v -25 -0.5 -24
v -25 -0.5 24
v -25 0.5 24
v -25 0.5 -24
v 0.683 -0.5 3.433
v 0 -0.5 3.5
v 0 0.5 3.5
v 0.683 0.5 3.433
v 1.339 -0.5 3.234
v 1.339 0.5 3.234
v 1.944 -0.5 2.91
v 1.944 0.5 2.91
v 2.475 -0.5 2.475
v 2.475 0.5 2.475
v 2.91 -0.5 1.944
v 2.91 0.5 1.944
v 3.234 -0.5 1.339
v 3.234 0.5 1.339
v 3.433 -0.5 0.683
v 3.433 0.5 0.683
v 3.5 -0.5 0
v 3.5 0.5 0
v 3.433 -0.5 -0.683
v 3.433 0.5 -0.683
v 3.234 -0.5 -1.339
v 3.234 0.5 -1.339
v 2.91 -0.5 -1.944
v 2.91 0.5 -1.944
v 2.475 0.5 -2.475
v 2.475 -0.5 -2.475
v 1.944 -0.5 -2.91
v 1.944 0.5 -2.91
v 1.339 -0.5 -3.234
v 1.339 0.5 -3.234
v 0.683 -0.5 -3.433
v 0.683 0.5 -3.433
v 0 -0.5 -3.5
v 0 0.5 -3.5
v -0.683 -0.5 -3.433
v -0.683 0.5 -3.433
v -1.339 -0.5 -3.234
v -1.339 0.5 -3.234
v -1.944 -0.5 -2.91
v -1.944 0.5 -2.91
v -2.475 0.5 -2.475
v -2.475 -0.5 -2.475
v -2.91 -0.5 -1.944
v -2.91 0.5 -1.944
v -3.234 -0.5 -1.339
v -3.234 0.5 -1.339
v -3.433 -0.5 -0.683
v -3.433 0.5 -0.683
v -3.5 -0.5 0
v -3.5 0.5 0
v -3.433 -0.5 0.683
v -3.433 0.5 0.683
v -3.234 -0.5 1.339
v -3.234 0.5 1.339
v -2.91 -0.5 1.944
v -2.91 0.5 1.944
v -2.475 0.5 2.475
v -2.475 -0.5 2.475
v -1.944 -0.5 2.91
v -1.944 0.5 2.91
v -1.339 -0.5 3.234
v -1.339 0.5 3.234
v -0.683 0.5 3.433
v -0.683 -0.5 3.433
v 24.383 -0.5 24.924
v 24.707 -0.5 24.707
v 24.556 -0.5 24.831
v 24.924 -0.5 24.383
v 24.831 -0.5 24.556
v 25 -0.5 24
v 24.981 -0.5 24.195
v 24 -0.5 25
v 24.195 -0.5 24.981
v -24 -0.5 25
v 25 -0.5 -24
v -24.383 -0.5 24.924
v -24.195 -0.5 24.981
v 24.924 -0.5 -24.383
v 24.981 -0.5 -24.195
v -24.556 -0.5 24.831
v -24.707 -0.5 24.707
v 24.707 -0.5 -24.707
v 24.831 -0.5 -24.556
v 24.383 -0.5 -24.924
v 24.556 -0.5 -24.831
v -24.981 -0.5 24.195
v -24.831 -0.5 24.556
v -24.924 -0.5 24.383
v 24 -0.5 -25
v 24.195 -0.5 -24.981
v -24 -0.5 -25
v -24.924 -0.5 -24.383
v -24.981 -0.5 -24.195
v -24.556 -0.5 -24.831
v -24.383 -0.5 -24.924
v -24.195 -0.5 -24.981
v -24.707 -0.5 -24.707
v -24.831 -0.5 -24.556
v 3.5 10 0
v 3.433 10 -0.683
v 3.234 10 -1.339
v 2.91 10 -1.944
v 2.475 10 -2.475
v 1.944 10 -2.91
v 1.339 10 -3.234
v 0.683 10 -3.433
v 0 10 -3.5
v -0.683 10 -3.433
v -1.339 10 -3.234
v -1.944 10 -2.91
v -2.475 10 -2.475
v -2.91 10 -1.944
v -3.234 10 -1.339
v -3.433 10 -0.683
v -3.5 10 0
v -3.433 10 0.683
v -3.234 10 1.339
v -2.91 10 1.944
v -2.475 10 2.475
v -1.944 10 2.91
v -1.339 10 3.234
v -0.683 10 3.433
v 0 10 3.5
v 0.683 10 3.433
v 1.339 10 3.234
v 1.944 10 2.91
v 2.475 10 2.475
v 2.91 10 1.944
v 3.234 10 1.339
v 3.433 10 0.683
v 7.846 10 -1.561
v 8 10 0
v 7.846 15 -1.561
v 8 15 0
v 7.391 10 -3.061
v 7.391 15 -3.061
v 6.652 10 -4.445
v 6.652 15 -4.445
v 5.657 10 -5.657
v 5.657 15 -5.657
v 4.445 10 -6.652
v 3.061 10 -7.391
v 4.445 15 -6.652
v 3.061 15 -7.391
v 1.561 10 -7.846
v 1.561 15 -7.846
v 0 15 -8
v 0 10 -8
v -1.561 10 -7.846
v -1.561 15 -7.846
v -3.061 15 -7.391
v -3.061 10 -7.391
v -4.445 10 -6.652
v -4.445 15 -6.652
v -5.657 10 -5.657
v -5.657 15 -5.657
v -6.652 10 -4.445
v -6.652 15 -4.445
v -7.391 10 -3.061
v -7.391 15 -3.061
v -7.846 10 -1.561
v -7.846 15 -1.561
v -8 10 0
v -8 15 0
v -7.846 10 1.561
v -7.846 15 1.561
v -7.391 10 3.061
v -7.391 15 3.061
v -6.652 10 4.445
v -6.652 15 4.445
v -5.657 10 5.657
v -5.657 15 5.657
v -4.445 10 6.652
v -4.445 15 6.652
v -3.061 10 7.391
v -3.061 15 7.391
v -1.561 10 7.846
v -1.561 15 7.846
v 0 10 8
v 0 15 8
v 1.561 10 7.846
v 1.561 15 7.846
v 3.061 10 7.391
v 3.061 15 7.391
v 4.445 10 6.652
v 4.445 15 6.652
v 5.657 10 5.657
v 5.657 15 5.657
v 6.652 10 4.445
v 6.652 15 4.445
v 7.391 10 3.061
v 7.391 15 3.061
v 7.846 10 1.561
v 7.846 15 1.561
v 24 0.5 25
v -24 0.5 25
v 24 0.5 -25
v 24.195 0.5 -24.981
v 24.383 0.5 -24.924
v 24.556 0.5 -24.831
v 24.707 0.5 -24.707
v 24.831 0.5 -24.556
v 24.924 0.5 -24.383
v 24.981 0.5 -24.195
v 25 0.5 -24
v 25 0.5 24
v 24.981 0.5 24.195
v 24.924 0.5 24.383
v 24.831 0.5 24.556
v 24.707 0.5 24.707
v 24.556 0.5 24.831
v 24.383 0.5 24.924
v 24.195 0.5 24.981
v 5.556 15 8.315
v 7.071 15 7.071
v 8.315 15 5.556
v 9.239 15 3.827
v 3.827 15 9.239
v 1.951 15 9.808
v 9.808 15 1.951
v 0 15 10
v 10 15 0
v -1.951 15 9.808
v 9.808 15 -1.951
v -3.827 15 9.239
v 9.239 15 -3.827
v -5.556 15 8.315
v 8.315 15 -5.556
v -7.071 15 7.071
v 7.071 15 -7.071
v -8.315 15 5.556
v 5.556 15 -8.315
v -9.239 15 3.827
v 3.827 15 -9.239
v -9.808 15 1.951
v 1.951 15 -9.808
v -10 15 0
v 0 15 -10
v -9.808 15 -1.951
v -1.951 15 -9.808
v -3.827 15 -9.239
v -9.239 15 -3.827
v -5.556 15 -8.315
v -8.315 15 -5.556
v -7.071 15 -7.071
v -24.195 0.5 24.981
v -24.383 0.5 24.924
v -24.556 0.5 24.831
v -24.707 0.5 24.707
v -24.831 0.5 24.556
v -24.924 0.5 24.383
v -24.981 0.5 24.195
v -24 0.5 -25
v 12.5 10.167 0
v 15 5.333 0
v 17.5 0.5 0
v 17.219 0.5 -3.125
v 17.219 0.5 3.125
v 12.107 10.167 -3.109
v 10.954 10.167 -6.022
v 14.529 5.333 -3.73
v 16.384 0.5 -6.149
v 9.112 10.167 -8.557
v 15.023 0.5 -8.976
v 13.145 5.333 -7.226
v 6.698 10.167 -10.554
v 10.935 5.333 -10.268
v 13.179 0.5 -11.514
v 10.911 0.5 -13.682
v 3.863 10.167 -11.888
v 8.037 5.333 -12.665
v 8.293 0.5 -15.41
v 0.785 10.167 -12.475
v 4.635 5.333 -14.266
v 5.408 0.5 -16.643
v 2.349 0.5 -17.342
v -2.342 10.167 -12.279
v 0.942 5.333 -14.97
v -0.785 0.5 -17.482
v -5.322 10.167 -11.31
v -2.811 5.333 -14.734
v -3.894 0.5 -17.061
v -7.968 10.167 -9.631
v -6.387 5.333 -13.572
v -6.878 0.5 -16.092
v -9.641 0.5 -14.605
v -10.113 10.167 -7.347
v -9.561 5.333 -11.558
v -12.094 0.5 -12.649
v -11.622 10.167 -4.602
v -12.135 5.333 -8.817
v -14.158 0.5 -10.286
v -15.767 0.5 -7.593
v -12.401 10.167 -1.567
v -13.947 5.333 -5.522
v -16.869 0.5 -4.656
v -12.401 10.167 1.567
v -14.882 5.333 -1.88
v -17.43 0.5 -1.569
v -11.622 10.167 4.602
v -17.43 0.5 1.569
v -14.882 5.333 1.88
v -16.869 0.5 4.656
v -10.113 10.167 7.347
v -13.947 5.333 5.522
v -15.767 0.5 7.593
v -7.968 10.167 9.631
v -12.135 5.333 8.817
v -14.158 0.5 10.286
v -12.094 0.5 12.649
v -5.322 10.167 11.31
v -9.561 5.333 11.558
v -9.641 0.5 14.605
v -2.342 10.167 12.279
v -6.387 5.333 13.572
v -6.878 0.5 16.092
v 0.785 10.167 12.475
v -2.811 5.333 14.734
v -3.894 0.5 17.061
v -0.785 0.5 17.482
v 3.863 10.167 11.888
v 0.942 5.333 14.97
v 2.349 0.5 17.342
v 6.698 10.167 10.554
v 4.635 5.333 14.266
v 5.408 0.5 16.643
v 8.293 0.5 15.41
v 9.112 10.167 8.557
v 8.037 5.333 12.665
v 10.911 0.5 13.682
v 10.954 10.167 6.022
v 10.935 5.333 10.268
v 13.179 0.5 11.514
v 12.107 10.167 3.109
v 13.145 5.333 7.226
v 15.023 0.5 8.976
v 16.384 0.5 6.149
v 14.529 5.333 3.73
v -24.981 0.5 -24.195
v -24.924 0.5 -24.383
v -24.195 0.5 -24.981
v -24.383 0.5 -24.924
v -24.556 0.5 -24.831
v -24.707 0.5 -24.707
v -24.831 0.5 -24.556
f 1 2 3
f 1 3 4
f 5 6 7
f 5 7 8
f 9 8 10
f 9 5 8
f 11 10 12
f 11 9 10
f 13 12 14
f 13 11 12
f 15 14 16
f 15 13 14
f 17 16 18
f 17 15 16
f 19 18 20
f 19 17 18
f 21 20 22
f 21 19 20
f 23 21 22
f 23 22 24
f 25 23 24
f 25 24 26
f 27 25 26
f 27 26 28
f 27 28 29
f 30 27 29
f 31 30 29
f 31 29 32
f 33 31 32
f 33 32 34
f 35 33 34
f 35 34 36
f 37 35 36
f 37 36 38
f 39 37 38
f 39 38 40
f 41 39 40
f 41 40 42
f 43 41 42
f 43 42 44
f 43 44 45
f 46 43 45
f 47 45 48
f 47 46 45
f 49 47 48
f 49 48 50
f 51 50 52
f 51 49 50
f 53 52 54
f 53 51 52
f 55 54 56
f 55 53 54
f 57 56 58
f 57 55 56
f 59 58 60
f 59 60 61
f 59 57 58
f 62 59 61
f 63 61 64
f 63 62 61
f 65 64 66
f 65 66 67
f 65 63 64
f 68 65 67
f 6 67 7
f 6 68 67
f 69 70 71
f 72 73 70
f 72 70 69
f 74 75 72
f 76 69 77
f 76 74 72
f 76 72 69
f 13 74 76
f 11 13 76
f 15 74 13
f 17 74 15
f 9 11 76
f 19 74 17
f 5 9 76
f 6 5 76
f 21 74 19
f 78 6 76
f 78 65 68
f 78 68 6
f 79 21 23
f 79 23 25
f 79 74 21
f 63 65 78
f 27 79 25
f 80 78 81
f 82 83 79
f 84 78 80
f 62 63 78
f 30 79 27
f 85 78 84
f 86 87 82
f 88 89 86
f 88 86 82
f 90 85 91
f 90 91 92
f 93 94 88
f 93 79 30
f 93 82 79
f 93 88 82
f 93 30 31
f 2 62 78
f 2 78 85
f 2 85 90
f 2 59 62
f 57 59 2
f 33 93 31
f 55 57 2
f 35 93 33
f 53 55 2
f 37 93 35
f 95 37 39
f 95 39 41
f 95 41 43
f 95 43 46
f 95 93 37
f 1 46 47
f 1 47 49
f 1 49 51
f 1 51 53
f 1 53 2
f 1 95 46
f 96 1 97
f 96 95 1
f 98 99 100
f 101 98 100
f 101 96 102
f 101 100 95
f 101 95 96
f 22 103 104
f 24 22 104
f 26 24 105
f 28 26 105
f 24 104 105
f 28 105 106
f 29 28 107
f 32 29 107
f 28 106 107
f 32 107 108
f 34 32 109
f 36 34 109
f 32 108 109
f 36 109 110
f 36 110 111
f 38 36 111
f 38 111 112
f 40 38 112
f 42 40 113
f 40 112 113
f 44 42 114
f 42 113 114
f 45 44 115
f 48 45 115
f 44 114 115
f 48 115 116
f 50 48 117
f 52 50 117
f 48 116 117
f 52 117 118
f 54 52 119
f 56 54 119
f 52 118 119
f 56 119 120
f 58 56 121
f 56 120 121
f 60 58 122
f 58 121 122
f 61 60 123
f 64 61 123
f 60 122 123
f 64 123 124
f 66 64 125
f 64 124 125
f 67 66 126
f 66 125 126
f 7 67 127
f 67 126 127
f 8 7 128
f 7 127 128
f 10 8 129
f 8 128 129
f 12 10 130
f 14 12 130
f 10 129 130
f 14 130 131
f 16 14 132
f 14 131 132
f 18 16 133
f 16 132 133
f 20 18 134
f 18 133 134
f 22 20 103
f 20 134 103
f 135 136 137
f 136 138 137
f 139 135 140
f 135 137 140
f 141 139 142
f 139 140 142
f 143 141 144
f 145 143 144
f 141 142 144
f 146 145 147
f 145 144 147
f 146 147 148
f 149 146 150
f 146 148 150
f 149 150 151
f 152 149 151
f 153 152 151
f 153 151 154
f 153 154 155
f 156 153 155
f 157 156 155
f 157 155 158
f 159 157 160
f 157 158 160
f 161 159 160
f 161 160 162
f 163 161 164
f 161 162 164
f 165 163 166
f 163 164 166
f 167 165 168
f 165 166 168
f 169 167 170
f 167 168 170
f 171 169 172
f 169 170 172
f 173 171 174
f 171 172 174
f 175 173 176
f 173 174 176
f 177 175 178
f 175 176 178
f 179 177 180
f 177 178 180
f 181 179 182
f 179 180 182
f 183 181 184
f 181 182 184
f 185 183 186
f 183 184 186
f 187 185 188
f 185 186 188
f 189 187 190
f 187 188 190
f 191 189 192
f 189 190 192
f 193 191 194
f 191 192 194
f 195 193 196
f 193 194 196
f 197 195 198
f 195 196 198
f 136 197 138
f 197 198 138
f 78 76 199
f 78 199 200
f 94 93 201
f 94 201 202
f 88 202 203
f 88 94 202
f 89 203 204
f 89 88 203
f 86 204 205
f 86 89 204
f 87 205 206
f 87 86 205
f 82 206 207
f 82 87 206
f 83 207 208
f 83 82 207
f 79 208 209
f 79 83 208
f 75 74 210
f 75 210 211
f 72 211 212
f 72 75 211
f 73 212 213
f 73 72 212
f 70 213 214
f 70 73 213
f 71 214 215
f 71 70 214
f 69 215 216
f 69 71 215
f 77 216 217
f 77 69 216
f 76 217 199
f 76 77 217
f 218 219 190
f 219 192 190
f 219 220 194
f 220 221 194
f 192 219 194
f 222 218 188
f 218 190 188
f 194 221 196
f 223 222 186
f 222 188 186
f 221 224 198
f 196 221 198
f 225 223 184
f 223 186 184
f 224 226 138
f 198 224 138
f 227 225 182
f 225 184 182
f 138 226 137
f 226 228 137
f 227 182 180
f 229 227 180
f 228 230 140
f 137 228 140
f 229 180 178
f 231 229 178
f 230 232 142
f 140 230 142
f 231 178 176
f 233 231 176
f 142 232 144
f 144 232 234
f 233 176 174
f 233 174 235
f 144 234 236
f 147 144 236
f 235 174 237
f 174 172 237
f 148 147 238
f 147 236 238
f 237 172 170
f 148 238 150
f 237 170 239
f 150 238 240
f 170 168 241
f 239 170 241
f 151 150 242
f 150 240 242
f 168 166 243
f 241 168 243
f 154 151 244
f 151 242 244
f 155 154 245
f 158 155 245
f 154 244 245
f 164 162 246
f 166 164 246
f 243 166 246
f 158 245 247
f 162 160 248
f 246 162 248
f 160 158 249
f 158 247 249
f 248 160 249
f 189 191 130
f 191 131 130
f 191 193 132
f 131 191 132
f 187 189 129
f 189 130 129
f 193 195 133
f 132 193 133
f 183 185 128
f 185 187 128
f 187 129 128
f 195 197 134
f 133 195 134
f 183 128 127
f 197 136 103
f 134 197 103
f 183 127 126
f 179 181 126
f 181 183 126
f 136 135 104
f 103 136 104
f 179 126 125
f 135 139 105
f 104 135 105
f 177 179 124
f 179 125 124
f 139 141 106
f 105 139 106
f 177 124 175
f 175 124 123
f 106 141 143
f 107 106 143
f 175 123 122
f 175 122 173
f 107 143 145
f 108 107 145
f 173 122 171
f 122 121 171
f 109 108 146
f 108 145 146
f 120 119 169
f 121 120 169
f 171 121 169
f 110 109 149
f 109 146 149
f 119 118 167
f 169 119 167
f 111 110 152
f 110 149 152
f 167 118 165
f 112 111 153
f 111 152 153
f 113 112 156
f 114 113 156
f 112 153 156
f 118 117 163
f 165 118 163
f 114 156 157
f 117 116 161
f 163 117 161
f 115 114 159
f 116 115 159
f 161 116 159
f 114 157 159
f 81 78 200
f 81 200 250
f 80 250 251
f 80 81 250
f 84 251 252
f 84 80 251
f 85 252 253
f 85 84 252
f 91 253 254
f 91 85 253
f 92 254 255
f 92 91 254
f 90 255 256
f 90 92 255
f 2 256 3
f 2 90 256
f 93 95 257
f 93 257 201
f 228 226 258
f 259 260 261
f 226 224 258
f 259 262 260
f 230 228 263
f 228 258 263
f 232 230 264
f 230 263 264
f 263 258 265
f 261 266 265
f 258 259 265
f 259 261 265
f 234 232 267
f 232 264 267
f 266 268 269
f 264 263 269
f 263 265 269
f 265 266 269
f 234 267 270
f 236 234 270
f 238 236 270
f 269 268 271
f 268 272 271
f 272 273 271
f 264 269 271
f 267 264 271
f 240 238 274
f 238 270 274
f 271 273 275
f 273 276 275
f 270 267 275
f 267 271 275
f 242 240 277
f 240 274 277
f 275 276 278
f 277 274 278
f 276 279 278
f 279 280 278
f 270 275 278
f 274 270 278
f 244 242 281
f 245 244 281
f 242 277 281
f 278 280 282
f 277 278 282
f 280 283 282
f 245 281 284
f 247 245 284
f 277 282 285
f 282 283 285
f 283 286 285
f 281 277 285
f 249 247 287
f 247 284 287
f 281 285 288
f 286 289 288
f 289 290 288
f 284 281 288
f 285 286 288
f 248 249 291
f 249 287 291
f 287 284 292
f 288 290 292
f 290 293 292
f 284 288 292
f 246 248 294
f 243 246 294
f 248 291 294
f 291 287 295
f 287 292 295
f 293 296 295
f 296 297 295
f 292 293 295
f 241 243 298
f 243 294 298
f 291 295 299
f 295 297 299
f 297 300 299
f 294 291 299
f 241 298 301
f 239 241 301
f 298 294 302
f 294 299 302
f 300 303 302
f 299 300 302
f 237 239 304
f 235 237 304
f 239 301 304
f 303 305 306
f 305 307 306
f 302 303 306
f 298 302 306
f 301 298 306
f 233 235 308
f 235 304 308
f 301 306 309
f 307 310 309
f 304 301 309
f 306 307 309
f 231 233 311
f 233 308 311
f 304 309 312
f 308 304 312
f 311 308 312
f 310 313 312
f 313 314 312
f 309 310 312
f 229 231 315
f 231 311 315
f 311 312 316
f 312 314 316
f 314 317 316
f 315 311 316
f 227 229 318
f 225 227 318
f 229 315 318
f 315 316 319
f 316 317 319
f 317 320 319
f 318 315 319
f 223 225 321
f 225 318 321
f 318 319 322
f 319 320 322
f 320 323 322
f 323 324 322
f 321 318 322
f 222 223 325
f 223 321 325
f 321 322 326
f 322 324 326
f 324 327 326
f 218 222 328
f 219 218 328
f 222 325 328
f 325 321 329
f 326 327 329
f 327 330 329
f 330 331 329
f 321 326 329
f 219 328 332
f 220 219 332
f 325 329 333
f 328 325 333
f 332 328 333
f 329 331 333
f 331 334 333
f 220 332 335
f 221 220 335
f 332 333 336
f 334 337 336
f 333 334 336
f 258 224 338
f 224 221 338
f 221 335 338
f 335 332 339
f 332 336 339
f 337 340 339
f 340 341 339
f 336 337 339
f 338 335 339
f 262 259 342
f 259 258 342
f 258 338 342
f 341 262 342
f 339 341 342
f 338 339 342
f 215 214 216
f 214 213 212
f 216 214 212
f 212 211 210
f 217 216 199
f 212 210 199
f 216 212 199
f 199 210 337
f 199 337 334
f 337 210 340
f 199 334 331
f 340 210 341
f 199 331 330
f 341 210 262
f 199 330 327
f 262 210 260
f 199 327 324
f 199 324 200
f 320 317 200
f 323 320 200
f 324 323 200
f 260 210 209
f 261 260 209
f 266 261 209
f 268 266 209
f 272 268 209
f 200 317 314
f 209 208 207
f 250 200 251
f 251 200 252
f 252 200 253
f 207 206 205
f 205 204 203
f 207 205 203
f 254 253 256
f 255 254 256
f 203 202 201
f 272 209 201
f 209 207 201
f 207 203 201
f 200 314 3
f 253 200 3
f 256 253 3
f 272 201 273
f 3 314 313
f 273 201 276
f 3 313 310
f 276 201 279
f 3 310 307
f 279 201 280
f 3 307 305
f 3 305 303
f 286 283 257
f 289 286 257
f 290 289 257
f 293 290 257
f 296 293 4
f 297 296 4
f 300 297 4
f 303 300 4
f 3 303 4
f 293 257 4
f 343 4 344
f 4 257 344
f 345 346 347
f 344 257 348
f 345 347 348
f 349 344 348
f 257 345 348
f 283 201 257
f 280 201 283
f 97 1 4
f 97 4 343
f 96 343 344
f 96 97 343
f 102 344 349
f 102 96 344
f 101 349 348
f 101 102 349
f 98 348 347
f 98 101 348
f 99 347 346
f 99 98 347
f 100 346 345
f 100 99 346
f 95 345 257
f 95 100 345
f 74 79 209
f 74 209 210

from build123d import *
from build123d.topology import SkipClean

# Parameters (mm, degrees)
BOSS_EXTRUDE1_DEPTH      = 0.5
BOSS_EXTRUDE1_DEPTH_BACK = 0.5
SKETCH1_R                = 3.5


with BuildPart() as part:
    # Sketch1 → Boss-Extrude1 (new, two sides: drawn at the far end of the back side and taken through both)
    with BuildSketch(Plane(origin=(0, 0, 0), x_dir=(1, 0, 0), z_dir=(0, 1, 0)).offset(-BOSS_EXTRUDE1_DEPTH_BACK)):
        with BuildLine():
            Line((-24, 25), (24, 25))
            ThreePointArc((24, 25), (24.707106781, 24.707106781), (25, 24))
            Line((25, 24), (25, -24))
            ThreePointArc((25, -24), (24.707106781, -24.707106781), (24, -25))
            Line((24, -25), (-24, -25))
            ThreePointArc((-24, -25), (-24.707106781, -24.707106781), (-25, -24))
            Line((-25, -24), (-25, 24))
            ThreePointArc((-25, 24), (-24.707106781, 24.707106781), (-24, 25))
        make_face()
        Circle(SKETCH1_R, mode=Mode.SUBTRACT)
    extrude(amount=BOSS_EXTRUDE1_DEPTH + BOSS_EXTRUDE1_DEPTH_BACK)

    # Sketch2 → Revolve1 (revolve)
    with SkipClean():  # the faces are left unmerged after this step: merging them gives an invalid solid
        with BuildSketch(Plane.XY):
            Polygon((-8, 15), (-10, 15), (-17.5, 0.5), (-3.5, 0.5), (-3.5, 10), (-8, 10), align=None)
        revolve(axis=Axis((0, 0.5, 0), (0, 1, 0)))
    add(part.part.scale(1), mode=Mode.REPLACE)  # the faces are merged on a copy


solid = part.part
